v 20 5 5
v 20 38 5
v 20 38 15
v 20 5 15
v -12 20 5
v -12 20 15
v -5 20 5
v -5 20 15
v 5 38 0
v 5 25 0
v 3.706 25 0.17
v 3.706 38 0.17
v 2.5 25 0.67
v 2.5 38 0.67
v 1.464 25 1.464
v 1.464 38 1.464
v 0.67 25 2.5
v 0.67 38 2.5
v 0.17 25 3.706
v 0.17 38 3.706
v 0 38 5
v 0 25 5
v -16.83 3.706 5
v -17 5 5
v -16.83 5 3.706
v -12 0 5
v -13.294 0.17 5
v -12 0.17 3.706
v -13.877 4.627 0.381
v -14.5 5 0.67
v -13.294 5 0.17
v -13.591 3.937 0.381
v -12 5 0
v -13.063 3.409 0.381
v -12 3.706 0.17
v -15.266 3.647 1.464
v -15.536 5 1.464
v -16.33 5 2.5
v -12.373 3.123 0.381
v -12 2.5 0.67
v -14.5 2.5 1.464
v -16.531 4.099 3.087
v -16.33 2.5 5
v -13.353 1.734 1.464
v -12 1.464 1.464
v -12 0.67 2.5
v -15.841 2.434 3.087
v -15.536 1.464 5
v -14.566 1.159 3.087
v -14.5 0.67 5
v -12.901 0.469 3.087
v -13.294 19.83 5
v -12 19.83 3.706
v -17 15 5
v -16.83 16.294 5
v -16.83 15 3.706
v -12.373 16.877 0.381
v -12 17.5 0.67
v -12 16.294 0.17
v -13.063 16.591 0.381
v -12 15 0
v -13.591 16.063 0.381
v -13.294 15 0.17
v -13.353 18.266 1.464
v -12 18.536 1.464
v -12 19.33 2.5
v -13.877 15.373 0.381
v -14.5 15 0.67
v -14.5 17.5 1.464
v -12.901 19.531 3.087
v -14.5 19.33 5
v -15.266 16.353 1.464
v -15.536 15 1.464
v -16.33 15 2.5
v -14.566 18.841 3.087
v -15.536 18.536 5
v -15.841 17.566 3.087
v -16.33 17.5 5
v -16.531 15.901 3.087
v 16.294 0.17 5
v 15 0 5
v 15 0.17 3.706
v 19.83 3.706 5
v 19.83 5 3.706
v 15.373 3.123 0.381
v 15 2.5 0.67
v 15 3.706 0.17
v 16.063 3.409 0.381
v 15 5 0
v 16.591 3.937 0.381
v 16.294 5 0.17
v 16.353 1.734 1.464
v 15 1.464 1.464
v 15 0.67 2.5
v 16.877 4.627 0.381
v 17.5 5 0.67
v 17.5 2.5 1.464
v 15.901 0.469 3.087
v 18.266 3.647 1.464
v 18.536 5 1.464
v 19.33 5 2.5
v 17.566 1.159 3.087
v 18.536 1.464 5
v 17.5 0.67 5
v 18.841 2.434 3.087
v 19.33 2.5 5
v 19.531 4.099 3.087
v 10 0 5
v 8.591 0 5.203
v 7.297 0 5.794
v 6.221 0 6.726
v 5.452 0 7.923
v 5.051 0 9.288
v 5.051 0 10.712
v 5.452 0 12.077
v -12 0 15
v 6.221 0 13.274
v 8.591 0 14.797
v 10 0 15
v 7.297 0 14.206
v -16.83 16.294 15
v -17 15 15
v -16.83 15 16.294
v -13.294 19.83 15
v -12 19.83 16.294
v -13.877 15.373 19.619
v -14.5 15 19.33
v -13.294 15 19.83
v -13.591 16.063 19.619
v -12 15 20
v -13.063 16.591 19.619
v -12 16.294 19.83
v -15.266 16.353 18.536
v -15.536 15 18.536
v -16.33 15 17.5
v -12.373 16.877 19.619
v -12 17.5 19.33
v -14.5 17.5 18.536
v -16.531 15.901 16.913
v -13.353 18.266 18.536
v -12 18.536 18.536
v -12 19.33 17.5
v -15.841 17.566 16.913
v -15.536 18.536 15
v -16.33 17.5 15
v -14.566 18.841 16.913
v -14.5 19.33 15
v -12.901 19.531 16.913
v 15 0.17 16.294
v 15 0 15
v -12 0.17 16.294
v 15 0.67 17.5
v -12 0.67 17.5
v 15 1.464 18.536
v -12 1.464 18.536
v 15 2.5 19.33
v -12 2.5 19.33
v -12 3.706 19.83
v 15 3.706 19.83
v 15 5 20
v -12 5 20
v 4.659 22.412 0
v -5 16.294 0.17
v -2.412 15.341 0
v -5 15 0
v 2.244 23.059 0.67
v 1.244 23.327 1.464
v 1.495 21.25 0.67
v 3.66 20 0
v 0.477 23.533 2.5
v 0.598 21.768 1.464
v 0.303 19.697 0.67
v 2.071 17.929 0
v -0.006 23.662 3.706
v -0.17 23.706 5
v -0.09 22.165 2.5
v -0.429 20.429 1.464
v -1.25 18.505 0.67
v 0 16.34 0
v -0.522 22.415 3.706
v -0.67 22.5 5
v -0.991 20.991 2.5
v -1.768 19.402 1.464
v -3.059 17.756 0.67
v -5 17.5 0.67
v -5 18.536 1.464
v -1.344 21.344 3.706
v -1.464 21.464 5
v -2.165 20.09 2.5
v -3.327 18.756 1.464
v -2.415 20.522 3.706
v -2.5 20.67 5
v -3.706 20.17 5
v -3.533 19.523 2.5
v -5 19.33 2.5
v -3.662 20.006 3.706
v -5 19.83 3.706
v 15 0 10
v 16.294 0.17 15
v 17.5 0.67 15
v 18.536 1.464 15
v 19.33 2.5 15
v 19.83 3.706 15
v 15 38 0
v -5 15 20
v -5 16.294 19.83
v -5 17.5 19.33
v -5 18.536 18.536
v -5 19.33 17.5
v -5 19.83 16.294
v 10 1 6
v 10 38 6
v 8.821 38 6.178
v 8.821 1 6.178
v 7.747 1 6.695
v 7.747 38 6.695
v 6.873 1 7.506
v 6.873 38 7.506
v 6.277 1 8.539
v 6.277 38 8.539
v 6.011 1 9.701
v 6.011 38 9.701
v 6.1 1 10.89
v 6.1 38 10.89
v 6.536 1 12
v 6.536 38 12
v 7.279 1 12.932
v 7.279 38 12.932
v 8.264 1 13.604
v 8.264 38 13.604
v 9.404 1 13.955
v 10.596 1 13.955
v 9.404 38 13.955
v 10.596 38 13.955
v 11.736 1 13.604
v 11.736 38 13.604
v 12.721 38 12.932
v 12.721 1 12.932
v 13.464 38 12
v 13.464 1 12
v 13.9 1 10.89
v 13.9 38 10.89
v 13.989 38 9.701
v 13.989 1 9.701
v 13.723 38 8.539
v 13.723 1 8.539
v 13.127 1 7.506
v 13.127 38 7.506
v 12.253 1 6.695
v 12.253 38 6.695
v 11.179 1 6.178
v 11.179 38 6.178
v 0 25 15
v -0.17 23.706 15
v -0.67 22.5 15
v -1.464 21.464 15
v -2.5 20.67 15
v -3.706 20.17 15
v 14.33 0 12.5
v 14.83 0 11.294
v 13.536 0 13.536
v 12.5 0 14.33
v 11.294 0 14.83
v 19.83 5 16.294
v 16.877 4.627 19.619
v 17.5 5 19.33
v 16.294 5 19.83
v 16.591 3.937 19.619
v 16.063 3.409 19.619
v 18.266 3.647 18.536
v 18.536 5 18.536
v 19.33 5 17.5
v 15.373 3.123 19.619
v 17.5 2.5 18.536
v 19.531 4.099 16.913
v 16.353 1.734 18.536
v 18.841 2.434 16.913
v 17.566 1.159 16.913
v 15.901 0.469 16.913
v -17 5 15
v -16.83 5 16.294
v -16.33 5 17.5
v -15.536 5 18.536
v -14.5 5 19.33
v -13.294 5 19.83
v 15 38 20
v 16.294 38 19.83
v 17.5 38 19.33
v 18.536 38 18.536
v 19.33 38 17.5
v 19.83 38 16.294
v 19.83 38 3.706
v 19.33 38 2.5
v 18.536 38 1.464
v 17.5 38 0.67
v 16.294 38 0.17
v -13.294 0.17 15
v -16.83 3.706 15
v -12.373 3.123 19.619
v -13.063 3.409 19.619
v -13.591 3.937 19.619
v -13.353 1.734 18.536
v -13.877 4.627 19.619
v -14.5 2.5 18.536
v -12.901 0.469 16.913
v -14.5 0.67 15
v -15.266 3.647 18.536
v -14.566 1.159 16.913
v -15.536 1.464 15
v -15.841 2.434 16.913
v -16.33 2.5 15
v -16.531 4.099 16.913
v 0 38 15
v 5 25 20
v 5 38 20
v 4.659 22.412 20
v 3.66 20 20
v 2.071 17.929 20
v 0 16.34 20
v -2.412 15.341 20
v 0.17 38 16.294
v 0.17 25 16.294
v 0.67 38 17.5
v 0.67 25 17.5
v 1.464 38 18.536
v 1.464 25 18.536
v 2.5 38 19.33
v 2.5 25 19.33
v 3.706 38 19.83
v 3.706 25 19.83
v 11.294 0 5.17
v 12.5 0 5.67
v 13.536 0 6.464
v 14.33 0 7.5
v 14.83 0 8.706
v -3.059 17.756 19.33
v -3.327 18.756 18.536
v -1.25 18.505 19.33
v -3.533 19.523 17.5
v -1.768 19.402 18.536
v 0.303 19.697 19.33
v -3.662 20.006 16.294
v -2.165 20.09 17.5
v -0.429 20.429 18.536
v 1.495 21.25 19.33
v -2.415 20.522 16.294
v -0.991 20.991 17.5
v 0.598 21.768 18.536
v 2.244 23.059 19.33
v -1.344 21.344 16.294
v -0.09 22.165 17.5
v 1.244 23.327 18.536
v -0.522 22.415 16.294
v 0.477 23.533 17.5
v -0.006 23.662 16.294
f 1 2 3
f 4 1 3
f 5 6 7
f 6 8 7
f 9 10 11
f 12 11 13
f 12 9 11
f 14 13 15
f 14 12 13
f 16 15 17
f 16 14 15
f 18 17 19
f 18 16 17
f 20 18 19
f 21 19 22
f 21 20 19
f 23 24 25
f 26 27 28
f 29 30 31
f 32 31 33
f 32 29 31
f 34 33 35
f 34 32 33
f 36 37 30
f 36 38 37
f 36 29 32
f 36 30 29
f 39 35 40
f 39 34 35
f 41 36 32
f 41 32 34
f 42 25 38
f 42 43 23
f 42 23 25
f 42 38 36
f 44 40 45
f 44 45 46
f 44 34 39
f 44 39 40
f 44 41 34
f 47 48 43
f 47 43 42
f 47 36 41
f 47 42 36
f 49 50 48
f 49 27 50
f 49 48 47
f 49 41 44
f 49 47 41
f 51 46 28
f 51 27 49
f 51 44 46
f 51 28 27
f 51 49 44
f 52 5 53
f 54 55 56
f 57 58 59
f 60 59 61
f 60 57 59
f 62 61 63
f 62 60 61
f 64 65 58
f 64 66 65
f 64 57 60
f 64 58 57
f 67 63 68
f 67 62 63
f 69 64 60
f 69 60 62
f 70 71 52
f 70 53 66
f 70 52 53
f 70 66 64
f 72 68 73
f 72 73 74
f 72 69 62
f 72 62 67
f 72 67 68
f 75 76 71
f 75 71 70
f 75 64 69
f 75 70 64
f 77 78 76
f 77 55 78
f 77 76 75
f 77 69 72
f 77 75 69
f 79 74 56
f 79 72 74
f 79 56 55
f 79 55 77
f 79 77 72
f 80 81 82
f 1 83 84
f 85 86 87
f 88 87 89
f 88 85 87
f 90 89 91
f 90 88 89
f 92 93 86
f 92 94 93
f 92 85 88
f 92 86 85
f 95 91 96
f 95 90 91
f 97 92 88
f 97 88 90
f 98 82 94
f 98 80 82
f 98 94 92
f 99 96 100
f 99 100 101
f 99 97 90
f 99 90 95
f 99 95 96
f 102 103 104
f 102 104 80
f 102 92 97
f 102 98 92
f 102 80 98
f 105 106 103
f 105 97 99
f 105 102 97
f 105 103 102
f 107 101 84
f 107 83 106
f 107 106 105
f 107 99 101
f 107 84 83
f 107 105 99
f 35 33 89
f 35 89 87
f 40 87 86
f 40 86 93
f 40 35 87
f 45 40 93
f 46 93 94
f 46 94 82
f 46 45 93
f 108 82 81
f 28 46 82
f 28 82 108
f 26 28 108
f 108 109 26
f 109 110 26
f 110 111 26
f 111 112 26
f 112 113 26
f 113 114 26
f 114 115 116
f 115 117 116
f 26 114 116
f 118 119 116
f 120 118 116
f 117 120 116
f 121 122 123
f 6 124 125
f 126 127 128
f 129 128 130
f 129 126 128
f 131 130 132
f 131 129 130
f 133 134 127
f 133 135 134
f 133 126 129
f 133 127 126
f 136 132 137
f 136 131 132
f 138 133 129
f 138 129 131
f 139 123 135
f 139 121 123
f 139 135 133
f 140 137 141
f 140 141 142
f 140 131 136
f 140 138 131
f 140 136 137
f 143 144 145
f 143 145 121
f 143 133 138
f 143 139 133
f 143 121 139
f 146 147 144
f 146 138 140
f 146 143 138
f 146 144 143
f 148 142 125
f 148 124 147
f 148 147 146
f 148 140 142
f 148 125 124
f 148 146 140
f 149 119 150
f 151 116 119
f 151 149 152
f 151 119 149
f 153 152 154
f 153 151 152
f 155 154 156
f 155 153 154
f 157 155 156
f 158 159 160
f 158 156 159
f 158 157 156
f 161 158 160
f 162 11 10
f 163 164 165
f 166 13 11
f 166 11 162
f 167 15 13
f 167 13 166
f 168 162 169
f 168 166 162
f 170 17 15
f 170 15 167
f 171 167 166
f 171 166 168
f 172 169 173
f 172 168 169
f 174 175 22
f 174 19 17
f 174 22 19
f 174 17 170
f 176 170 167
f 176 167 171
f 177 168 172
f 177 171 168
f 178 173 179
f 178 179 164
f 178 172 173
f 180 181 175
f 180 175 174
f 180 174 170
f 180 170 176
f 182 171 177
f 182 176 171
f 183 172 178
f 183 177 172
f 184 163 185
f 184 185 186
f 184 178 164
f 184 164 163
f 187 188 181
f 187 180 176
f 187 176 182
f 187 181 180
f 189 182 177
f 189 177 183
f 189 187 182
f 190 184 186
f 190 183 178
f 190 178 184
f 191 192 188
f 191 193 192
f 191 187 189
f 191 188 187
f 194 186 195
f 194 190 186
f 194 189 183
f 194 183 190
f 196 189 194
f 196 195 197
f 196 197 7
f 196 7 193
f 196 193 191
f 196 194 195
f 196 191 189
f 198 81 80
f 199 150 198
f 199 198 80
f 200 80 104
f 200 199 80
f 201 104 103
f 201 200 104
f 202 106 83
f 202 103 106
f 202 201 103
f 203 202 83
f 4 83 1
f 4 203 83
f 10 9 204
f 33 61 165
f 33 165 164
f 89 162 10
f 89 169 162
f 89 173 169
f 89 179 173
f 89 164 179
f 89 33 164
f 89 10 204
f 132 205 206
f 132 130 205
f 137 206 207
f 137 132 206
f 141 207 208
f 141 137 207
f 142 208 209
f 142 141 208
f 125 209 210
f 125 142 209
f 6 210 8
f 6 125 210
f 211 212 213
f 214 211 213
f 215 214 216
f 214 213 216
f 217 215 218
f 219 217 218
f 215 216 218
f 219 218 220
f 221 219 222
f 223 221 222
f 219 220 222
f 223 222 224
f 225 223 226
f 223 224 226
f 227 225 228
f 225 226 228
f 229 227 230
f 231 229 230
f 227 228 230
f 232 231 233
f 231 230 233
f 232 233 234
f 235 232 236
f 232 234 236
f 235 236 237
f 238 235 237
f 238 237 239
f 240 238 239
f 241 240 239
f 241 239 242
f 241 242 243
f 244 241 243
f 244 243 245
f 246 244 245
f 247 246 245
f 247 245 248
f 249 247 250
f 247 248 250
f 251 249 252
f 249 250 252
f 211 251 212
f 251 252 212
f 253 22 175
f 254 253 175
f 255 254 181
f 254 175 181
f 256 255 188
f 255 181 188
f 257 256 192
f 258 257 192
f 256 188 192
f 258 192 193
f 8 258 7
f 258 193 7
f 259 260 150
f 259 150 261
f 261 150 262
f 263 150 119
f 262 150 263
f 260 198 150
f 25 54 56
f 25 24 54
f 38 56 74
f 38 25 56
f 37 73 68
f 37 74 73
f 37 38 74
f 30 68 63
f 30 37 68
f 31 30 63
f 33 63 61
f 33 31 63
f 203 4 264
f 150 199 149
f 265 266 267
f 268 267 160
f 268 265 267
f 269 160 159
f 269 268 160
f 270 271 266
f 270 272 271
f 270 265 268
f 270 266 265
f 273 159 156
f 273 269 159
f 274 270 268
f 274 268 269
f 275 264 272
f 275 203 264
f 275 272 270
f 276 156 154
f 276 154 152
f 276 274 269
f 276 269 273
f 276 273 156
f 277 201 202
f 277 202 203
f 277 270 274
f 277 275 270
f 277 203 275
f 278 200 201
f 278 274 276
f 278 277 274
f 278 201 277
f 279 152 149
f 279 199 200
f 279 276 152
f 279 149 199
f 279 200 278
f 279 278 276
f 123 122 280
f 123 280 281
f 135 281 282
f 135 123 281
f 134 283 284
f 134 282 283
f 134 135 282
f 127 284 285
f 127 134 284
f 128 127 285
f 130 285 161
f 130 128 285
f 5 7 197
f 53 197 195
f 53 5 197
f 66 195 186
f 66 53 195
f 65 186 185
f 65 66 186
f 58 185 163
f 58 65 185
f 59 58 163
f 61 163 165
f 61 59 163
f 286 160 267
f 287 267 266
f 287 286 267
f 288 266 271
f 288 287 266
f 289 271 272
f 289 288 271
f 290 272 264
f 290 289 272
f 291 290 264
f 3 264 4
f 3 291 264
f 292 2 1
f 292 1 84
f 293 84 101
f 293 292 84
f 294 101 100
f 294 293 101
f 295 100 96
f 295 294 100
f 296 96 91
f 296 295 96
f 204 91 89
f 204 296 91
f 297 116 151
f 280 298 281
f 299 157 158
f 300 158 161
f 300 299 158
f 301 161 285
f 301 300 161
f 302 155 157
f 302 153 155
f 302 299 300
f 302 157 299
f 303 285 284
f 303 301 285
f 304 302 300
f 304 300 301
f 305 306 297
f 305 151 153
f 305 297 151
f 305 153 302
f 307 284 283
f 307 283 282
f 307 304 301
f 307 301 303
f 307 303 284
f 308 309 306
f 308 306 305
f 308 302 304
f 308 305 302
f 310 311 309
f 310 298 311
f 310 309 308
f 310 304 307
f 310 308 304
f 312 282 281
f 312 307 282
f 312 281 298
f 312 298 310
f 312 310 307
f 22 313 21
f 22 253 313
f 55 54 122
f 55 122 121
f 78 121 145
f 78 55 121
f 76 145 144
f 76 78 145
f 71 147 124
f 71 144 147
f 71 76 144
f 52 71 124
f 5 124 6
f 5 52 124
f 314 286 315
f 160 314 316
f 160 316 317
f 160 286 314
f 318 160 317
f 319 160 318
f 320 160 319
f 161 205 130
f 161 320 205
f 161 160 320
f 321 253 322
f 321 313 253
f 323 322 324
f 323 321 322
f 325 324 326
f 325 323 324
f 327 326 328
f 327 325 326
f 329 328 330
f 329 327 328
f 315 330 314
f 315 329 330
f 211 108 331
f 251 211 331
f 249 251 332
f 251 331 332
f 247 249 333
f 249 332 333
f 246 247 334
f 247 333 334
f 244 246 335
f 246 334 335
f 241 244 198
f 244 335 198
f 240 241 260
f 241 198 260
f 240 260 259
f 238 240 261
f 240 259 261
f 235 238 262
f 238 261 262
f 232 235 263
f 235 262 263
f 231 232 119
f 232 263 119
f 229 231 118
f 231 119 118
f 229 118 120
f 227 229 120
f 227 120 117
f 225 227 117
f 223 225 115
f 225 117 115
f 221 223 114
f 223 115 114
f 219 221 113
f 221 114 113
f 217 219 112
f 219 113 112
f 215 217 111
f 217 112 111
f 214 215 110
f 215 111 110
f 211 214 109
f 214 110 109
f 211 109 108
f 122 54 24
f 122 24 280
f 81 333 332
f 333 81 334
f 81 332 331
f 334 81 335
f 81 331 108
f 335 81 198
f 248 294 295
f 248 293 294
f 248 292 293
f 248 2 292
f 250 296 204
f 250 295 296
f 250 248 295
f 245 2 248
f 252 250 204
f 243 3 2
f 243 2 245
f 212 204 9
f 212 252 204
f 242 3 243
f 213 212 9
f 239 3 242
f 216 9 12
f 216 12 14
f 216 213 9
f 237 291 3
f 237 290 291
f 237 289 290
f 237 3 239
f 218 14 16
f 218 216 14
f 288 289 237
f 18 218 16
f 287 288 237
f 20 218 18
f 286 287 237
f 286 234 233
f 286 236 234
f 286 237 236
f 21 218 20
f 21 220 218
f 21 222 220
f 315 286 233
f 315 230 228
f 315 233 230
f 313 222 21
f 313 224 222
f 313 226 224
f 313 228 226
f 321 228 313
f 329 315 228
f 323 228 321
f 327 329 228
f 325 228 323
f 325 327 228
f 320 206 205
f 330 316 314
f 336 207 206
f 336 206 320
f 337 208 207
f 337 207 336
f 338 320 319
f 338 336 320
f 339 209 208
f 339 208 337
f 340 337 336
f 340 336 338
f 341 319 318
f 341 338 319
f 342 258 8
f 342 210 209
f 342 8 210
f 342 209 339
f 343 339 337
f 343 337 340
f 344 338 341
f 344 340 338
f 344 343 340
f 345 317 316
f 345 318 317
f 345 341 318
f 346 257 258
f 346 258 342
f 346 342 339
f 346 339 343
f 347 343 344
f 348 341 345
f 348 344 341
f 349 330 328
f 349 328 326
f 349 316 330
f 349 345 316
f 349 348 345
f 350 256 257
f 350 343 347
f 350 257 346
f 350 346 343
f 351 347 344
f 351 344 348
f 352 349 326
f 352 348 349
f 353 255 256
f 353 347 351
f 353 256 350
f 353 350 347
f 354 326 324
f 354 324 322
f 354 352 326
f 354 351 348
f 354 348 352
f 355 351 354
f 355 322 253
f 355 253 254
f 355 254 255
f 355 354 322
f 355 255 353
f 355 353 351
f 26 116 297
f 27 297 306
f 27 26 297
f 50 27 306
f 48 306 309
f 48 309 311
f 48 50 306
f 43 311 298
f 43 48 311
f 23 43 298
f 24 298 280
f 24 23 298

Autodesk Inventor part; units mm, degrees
ref_plane "YZ Plane" through (0, 0, 0) normal (1, 0, 0) x (0, 1, 0)
ref_plane "XZ Plane" through (0, 0, 0) normal (0, 1, 0) x (-1, 0, 0)
ref_plane "XY Plane" through (0, 0, 0) normal (0, 0, 1) x (1, 0, 0)
sketch "Skizze2" plane through (0, 0, 0) normal (0, 1, 0) x (-1, 0, 0)
  line L0 (0, 0) -> (-20, 0)
  line L1 (-20, 0) -> (-20, 20)
  line L2 (-20, 20) -> (0, 20)
  line L3 (0, 20) -> (0, 0)
  dimension "d4" = 20
  dimension "d5" = 20
extrude "Extrusion2" add sketch "Skizze2" along normal blind 38
sketch "Skizze4" plane through (0, 0, 0) normal (-1, 0, 0) x (0, 0, 1)
  line L0 (20, 0) -> (0, 0) projected
  line L1 (0, 0) -> (20, 0)
  line L2 (20, 0) -> (20, 20)
  line L3 (20, 20) -> (0, 20)
  line L4 (0, 20) -> (0, 0)
  dimension "d8" = 20
  dimension "d9" = 20
extrude "Extrusion3" add sketch "Skizze4" along normal blind 17
fillet "Rundung1" radius 5 14 edges at (0, 20, 10) (-17, 20, 10) (-17, 0, 10) (20, 0, 10) (1.5, 0, 20) (20, 19, 20) (20, 19, 0) (0, 29, 20) (0, 29, 0) (-8.5, 20, 20) (-8.5, 20, 0) (-17, 10, 20) (-17, 10, 0) (1.5, 0, 0)
sketch "Skizze5" plane through (0, 0, 0) normal (0, -1, 0) x (1, 0, 0)
  line L0 (0, 5) -> (0, 15) projected
  line L1 (0, 10) -> (0, 20)
  line L2 (0, 10) -> (10, 10)
  point P0 (0, 0)
  dimension "d13" = 10
  dimension "d14" = 10
hole "Bohrung1" at (10, 0, 10) direction (0, 1, 0) diameter 8 end through all countersink diameter 10 countersink angle 90
properties part number "Stoper" material "PVC, hart"
